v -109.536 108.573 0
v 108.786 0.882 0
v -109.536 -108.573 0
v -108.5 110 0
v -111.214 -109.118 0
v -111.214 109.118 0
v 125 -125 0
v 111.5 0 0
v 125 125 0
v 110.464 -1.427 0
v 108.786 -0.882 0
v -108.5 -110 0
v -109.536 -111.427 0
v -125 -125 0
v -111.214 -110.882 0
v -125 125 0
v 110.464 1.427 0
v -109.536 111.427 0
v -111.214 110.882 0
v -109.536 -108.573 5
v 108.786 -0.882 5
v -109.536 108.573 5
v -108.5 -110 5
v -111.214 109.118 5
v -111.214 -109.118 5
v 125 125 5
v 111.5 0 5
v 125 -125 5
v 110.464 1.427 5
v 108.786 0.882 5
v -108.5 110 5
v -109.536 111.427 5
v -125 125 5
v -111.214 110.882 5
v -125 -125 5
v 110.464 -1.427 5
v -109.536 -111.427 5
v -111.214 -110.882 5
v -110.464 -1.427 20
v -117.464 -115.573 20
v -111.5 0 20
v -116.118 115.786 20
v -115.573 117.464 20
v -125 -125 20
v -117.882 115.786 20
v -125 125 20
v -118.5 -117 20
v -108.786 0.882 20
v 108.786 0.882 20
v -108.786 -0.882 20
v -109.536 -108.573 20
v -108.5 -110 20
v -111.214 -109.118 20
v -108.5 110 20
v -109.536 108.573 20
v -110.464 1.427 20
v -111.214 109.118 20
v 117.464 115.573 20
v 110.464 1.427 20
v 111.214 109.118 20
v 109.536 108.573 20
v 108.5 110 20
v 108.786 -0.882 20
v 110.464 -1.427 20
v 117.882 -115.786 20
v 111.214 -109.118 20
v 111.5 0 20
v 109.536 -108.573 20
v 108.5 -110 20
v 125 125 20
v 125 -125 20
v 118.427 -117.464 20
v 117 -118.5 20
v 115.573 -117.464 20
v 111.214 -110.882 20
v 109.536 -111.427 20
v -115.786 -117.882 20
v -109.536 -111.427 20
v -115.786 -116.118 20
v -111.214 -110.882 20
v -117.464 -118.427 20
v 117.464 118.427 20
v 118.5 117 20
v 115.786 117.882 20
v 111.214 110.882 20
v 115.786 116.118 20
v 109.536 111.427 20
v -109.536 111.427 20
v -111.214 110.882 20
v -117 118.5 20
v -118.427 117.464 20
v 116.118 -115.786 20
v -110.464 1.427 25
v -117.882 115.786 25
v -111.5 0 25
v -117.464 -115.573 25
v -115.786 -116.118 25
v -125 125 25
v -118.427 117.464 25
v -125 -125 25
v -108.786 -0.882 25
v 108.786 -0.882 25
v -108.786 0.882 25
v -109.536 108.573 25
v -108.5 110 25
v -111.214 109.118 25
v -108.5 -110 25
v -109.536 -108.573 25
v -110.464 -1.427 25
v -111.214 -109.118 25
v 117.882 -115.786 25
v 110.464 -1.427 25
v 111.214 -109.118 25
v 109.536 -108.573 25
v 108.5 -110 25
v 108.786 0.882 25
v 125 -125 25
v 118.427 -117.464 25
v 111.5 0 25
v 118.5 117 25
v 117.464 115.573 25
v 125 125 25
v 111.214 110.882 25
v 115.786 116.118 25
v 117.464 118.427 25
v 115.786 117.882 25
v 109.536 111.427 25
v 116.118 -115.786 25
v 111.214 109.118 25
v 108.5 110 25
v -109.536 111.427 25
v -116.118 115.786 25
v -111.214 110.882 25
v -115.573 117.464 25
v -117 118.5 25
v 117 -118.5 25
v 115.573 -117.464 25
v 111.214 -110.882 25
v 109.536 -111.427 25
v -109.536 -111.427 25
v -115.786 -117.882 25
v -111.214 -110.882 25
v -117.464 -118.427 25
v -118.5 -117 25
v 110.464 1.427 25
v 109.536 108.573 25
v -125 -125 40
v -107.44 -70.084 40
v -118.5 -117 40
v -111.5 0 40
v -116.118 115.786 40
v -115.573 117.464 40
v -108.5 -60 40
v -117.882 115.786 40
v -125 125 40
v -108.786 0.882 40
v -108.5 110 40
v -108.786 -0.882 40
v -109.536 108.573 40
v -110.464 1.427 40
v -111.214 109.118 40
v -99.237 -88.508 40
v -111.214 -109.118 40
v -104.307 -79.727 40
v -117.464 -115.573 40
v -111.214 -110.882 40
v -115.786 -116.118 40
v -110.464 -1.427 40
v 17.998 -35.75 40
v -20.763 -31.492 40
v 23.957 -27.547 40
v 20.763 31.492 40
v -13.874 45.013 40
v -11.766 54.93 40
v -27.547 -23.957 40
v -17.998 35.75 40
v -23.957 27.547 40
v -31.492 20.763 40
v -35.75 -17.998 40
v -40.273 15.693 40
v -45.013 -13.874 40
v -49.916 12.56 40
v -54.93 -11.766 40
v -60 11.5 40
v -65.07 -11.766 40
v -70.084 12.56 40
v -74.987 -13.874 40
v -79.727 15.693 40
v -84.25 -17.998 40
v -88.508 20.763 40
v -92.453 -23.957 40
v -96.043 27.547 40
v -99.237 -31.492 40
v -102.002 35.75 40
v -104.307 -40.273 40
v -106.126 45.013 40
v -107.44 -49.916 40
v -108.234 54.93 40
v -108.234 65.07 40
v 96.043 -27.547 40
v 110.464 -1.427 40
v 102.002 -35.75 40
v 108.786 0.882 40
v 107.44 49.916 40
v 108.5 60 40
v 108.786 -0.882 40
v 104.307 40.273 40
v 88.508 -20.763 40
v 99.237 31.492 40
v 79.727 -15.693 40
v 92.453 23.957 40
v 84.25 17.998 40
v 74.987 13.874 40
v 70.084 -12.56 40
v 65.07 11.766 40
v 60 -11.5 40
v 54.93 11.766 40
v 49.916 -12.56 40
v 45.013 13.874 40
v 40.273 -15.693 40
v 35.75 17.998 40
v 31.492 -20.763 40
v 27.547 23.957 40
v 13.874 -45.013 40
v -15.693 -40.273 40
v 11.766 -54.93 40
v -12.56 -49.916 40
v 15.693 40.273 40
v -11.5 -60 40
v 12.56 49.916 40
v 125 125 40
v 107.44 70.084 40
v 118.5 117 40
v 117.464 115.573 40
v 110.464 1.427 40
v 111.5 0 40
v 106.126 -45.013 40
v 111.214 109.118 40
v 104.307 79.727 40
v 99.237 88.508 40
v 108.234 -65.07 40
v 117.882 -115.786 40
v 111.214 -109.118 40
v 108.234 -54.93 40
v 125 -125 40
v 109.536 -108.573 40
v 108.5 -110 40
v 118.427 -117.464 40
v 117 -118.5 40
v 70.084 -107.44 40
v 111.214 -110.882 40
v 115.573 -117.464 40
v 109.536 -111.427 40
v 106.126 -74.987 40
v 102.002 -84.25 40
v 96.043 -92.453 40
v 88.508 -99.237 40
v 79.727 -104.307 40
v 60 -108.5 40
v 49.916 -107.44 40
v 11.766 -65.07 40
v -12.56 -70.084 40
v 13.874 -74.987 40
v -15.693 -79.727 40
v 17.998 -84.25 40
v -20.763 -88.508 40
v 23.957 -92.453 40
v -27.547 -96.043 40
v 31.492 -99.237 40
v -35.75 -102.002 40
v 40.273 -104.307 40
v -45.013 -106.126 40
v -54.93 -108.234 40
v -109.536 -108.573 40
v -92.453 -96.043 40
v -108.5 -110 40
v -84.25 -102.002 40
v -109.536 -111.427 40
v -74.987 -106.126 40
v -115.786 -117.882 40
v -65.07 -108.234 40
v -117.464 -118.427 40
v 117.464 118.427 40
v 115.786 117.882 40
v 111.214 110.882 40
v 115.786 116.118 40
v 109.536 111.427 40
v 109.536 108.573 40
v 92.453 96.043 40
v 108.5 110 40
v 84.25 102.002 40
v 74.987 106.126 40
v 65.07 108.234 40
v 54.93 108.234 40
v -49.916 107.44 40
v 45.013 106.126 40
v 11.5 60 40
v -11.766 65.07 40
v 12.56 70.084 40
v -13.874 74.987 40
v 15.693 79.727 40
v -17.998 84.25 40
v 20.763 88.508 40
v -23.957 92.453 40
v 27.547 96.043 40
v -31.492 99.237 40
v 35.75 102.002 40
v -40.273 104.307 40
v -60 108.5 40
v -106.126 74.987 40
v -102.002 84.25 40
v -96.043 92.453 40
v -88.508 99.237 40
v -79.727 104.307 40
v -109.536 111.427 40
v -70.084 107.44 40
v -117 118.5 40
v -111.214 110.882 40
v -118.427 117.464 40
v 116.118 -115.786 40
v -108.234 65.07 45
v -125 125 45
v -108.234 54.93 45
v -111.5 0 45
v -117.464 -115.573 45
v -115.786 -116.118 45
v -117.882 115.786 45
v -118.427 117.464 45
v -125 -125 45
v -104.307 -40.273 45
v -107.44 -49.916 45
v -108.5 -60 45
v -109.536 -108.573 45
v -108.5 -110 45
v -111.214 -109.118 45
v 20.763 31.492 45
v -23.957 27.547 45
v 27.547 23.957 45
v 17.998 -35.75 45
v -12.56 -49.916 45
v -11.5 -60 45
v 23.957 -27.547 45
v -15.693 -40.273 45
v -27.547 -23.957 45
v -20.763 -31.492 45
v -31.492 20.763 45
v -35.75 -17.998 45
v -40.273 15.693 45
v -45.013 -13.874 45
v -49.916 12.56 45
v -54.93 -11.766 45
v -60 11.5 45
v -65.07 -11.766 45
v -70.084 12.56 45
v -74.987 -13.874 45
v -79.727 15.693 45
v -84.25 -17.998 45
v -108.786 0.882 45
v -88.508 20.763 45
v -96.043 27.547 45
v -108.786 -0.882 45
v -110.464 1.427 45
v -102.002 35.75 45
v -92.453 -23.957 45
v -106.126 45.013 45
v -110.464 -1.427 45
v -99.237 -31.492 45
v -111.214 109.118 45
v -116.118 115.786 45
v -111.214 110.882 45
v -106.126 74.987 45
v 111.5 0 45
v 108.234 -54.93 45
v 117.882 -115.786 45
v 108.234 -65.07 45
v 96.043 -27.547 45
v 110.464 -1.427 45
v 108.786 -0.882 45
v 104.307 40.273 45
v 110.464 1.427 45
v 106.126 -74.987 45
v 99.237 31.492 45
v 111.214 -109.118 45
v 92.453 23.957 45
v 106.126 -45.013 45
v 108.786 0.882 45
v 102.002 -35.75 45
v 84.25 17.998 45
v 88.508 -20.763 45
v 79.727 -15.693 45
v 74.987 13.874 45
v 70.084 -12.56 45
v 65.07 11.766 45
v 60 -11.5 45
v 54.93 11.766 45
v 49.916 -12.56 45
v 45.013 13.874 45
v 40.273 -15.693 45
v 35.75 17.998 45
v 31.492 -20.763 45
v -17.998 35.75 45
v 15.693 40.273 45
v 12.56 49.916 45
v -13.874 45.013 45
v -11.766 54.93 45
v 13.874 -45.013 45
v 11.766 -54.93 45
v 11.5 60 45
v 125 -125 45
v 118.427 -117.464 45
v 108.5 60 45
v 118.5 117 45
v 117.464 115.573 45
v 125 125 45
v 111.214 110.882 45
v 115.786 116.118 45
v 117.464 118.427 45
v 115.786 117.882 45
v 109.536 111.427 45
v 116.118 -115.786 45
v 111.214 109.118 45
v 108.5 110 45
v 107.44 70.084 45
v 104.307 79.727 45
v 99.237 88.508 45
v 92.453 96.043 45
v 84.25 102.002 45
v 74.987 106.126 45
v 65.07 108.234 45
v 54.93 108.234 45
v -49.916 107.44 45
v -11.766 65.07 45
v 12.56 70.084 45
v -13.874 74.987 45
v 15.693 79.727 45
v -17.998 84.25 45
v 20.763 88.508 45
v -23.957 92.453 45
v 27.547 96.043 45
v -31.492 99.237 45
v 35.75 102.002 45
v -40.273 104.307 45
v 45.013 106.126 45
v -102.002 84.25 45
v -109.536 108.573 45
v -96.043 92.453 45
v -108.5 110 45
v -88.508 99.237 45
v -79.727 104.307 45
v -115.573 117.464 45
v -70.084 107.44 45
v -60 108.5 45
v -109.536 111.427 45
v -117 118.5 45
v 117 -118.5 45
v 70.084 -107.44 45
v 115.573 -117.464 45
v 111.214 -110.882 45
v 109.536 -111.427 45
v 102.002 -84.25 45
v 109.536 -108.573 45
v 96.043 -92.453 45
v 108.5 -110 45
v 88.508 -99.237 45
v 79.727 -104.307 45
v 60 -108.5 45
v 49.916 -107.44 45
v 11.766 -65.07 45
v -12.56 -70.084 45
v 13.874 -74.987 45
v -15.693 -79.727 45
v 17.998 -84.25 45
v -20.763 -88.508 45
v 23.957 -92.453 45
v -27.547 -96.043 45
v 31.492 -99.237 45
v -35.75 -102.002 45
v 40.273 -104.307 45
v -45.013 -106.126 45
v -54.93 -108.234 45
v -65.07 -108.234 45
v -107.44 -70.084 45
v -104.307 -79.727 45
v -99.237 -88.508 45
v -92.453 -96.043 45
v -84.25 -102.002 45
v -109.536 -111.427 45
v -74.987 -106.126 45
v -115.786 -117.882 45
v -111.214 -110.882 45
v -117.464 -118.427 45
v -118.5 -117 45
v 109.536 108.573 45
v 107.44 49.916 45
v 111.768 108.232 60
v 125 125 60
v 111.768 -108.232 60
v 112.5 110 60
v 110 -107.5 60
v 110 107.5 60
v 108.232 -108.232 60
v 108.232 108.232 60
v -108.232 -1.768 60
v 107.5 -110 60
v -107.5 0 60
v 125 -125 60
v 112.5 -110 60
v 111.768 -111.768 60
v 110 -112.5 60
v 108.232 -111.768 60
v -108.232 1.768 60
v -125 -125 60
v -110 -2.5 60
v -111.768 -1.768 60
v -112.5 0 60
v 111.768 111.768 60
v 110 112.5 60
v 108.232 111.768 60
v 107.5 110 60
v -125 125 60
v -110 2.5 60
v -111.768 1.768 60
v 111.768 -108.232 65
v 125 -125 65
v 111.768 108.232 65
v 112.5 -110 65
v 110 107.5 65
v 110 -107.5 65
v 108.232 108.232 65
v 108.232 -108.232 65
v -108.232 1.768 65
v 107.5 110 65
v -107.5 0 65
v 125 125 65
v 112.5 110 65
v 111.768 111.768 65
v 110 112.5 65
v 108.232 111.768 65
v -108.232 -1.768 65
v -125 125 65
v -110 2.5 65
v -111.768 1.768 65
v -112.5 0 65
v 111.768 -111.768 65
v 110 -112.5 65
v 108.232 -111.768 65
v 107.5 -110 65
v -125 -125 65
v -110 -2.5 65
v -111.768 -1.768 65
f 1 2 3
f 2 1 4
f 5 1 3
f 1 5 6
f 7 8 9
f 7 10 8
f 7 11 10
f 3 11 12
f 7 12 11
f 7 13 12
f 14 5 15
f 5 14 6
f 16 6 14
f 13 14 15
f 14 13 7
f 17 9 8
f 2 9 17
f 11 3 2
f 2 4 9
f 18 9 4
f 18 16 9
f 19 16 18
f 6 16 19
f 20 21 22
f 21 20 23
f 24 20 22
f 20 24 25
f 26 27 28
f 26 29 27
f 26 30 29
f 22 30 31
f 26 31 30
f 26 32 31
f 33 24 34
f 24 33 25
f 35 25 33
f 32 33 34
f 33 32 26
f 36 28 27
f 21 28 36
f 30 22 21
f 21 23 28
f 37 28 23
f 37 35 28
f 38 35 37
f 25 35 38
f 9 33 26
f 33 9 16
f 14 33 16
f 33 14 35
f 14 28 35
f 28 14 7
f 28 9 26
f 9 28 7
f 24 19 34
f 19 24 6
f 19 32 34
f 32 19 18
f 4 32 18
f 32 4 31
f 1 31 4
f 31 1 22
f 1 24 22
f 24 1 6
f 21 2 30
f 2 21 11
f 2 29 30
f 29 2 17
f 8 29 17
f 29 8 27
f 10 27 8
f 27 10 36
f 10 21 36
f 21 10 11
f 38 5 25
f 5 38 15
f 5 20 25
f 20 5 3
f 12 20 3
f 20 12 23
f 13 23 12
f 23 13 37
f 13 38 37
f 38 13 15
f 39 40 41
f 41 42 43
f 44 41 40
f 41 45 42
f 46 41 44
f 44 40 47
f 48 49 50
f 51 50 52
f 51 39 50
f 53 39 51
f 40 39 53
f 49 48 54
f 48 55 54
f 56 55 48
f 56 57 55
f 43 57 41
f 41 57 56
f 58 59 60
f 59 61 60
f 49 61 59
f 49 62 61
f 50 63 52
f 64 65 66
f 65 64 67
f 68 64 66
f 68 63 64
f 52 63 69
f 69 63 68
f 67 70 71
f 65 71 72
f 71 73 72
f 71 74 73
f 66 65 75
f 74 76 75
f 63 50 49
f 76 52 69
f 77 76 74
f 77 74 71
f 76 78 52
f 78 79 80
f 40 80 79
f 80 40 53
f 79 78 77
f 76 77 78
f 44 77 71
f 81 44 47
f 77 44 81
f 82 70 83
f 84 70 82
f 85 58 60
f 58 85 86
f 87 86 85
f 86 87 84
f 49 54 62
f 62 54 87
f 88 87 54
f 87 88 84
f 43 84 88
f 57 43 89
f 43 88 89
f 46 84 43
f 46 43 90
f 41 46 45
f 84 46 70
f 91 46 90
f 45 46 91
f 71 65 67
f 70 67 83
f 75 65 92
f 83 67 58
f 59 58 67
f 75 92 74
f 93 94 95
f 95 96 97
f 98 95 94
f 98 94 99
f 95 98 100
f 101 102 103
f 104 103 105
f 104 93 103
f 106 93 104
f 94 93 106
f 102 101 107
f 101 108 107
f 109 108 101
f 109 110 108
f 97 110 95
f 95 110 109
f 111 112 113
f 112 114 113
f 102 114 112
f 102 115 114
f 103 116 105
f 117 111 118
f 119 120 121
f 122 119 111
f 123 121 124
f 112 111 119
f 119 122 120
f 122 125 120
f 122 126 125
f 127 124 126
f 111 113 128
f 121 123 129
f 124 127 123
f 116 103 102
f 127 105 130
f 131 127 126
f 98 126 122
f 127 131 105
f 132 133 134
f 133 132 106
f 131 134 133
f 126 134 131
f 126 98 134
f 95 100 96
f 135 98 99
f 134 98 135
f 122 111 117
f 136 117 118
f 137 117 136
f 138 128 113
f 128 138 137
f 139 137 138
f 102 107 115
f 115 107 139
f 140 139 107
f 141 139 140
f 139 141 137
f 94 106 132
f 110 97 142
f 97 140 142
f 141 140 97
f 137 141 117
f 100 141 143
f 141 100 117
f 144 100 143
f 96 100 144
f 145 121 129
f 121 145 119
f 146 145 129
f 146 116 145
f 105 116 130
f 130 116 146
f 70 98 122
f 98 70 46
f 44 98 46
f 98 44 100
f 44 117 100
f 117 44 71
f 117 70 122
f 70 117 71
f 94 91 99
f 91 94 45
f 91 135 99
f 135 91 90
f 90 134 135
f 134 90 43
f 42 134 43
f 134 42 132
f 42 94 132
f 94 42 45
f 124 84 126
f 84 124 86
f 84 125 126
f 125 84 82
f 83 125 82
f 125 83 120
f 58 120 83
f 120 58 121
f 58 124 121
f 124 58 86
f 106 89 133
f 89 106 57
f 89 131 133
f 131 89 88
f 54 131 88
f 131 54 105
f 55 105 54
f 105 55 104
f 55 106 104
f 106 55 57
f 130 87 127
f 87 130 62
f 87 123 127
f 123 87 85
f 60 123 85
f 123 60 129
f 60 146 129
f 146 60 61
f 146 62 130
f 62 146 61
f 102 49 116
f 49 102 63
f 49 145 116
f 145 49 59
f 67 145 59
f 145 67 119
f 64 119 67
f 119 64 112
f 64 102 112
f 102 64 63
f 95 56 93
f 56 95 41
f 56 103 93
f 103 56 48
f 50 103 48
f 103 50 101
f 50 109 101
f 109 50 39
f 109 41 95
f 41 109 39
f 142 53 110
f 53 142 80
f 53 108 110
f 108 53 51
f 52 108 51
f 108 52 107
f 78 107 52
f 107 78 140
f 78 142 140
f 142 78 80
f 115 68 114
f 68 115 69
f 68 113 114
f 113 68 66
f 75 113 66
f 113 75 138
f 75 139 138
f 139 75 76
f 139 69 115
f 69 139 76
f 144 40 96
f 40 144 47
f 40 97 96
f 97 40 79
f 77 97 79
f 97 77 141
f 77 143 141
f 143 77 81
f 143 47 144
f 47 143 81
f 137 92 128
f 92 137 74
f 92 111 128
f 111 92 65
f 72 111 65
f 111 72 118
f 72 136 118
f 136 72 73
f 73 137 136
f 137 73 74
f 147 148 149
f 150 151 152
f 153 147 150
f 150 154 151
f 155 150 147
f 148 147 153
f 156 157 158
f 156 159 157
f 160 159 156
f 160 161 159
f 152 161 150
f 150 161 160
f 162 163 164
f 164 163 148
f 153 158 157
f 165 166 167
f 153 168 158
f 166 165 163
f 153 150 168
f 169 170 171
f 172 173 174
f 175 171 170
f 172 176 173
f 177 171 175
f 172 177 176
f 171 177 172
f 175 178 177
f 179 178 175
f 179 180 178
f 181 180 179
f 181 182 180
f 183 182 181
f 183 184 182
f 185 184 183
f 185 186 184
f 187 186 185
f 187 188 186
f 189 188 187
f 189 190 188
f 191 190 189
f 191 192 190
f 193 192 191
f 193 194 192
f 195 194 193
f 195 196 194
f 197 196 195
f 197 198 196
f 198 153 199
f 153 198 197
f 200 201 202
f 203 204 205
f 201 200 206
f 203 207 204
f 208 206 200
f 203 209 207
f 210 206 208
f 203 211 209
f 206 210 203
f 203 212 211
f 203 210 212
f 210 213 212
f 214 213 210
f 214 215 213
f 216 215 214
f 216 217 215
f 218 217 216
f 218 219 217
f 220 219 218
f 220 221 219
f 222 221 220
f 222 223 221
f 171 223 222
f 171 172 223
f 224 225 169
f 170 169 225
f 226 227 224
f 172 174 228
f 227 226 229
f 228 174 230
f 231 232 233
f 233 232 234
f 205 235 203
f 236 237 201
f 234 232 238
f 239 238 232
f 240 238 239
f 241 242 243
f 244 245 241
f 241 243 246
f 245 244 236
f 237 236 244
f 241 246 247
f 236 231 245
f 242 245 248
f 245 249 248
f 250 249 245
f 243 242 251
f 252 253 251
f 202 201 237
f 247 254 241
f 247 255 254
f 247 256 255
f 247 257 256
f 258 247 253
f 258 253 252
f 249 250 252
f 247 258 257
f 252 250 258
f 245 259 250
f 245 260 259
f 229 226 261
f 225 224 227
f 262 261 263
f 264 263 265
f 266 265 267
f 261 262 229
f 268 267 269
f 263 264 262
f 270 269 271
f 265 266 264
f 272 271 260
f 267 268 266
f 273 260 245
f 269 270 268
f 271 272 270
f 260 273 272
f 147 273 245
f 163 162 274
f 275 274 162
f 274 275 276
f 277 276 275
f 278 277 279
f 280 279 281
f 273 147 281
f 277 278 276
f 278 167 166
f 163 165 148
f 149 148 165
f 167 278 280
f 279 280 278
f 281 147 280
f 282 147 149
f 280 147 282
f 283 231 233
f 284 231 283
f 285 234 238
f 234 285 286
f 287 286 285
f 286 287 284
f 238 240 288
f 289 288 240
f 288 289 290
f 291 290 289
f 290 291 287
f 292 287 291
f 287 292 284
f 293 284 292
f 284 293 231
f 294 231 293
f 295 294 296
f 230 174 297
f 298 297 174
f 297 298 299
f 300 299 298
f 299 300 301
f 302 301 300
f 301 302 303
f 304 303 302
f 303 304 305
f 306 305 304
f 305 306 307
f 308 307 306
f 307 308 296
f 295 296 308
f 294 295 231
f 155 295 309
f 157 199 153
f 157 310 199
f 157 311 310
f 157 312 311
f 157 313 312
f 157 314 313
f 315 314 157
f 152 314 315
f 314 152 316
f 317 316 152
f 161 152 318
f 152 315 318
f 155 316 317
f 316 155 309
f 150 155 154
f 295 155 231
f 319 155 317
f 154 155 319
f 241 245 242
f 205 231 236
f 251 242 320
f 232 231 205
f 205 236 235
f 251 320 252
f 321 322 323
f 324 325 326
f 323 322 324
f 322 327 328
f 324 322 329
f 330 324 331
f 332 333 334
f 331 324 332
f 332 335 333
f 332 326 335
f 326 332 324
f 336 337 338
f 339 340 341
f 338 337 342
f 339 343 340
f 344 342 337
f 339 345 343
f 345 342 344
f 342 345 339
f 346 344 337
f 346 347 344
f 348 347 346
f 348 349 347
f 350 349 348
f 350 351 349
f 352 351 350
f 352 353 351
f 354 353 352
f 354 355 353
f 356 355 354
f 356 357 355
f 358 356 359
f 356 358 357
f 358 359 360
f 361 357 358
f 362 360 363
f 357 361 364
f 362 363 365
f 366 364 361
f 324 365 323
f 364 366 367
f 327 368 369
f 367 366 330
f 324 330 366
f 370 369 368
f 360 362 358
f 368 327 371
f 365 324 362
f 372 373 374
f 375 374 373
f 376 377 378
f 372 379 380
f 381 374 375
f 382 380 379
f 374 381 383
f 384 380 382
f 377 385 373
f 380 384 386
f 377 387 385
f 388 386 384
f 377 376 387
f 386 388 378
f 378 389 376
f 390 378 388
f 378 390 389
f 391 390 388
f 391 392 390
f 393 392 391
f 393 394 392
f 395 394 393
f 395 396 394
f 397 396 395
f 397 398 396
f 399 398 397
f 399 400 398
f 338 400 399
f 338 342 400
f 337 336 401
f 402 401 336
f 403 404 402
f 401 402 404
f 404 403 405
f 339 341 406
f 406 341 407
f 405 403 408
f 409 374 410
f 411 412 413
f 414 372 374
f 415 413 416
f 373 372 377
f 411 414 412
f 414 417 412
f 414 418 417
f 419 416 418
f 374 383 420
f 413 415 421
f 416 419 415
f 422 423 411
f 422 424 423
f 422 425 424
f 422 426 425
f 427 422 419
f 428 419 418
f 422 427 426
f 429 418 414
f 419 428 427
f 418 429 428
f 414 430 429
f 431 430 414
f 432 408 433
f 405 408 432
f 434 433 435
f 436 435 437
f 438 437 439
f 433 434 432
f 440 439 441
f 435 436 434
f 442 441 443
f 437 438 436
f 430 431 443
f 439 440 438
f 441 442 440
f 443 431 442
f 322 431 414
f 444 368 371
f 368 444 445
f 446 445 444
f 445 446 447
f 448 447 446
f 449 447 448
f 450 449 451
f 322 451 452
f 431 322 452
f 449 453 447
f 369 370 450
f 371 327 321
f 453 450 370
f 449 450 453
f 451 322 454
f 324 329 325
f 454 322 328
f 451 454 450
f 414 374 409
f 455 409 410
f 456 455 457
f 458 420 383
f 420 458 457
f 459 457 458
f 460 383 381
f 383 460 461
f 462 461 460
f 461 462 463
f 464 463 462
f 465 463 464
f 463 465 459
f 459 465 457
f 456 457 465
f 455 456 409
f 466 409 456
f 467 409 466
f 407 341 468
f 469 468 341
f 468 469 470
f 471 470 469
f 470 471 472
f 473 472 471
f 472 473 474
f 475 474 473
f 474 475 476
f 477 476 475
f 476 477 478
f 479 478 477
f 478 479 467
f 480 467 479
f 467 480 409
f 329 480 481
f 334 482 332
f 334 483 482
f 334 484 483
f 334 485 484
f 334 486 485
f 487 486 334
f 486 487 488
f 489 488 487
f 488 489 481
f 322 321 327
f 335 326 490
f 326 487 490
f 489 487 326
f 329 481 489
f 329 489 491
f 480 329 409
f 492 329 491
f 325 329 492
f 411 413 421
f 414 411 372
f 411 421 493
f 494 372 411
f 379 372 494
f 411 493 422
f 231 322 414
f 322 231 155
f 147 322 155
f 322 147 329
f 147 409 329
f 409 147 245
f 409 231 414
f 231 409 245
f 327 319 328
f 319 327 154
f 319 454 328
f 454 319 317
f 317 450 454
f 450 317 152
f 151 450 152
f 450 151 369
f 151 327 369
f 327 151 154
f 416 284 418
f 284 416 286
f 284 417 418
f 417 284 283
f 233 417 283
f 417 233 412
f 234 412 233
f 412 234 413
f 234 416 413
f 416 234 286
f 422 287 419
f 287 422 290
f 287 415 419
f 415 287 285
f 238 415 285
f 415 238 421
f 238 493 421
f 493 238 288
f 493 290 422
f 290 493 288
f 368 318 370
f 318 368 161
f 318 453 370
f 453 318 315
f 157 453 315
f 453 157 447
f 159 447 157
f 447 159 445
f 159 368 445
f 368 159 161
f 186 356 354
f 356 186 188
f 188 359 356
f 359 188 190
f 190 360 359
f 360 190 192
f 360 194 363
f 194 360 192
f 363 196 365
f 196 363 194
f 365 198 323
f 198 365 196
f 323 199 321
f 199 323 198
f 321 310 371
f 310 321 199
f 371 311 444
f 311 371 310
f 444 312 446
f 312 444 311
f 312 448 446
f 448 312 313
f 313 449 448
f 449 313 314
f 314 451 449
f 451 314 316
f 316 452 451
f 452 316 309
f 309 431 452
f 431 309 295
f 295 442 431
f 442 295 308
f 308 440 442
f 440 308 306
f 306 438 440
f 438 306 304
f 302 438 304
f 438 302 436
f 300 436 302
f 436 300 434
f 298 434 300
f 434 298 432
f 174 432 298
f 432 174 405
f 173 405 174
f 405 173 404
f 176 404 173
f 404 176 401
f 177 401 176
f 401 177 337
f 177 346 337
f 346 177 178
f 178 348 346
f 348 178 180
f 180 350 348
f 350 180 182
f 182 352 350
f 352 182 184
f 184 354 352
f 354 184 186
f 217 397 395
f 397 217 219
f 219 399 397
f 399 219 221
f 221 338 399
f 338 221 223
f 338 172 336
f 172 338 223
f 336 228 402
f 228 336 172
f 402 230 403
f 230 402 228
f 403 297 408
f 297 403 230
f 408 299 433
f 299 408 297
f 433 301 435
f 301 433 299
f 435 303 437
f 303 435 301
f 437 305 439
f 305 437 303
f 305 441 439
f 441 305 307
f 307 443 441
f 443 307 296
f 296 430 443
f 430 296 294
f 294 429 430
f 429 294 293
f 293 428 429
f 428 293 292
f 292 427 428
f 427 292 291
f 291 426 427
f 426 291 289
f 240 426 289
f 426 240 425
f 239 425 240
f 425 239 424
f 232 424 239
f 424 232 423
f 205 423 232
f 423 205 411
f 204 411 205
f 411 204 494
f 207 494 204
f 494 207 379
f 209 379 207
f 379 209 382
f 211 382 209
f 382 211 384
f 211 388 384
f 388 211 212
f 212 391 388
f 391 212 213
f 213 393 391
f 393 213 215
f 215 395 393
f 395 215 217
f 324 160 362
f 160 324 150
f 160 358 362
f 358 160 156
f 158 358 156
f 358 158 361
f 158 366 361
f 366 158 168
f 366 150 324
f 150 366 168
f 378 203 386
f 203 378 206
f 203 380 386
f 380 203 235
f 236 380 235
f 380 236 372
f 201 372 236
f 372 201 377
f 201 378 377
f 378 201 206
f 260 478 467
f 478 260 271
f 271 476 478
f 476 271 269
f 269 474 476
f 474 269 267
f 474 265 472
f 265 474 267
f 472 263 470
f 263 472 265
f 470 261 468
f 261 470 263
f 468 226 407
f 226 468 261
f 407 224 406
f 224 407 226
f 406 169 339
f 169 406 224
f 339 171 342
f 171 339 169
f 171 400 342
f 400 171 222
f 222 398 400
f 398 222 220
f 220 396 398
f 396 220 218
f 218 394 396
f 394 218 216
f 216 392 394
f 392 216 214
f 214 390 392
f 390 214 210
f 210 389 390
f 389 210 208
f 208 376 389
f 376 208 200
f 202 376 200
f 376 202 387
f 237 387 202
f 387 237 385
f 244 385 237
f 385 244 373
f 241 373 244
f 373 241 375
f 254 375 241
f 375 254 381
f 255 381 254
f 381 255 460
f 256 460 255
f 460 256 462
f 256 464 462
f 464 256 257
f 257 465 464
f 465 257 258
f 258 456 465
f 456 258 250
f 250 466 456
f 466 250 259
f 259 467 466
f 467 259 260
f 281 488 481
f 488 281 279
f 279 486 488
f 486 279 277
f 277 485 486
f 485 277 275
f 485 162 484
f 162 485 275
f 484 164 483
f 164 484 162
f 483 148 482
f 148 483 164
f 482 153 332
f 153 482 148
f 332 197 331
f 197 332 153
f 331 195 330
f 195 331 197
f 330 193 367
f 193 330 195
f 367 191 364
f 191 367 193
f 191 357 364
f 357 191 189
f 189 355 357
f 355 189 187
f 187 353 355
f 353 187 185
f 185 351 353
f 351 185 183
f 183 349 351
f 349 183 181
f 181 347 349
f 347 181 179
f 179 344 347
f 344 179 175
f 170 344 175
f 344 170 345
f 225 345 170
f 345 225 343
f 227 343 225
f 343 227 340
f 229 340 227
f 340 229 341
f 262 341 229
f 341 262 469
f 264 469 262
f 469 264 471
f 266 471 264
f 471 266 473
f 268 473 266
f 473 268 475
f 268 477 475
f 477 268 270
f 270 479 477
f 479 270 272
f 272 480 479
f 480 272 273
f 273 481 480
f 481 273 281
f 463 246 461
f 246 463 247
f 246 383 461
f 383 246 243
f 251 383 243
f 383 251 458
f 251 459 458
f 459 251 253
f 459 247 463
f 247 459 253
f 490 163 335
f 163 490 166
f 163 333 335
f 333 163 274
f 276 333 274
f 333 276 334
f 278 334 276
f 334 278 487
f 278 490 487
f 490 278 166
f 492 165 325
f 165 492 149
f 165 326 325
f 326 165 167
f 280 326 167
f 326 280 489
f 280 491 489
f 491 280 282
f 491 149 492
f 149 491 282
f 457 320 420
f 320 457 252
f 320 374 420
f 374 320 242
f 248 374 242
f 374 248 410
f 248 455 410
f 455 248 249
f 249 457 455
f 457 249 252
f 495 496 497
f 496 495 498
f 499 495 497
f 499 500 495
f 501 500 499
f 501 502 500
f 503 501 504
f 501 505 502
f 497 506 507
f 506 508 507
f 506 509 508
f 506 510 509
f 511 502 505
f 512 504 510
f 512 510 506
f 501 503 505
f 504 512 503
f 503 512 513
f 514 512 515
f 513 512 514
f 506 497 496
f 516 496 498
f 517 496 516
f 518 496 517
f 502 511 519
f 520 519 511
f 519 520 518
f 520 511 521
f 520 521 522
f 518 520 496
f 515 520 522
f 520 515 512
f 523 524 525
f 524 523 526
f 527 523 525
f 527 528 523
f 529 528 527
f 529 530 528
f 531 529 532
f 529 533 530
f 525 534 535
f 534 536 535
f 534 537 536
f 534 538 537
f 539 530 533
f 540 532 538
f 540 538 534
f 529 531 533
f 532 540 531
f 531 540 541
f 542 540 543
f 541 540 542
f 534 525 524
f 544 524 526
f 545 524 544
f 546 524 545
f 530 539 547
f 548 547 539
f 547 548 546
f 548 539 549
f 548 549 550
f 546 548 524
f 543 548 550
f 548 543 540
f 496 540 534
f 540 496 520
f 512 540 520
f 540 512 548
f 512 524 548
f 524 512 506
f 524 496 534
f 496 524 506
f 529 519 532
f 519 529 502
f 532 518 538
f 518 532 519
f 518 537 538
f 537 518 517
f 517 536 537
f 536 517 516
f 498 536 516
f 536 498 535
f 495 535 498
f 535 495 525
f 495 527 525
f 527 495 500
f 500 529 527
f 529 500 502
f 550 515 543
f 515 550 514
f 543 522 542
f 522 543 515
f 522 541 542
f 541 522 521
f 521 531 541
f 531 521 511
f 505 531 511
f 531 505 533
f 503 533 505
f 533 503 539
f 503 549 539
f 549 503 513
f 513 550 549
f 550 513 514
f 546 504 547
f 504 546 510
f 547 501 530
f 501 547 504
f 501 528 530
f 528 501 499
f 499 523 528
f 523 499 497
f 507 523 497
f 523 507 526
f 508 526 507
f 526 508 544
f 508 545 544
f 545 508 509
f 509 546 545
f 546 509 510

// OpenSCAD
//Variables
dist = 110;
dist_a = 117;
size = 250;
petri = 97;

//Modules
module top() {
	difference() {
		square(size,center=true);
		for(i=[0:3])rotate(a=[0,0,90*i])translate([60,60])circle(r=petri/2);
		holes();
		cover_holes();
		level_holes();
	}
}

module middle() {
	difference() {
		base();
		holes();
		level_holes();
		cover_holes();
	}
}

module ground() {
	difference() {
		base();
		level_holes();
	}
}

module dust_cover() {
	difference() {
		base();
		cover_holes(ra=2.5);
	}
}

//Render
linear_extrude(height=5)ground();
translate([0,0,20])linear_extrude(height=5)middle();
translate([0,0,40])linear_extrude(height=5)top();
translate([0,0,60])linear_extrude(height=5)dust_cover();

//Helper Modules
module level_holes(ra=1.5) {
	translate([dist,0])circle(r=ra);
	translate([-dist,-dist])circle(r=ra);
	translate([-dist,dist])circle(r=ra);
}

module cover_holes(ra=1.5) {
	rotate(a=[0,0,180])level_holes(ra=ra);
}

module holes() {
		for(i=[0:3])rotate(a=[0,0,90*i])translate([dist_a,dist_a])circle(r=3/2);
}

module base() {
		square(size,center=true);
}
